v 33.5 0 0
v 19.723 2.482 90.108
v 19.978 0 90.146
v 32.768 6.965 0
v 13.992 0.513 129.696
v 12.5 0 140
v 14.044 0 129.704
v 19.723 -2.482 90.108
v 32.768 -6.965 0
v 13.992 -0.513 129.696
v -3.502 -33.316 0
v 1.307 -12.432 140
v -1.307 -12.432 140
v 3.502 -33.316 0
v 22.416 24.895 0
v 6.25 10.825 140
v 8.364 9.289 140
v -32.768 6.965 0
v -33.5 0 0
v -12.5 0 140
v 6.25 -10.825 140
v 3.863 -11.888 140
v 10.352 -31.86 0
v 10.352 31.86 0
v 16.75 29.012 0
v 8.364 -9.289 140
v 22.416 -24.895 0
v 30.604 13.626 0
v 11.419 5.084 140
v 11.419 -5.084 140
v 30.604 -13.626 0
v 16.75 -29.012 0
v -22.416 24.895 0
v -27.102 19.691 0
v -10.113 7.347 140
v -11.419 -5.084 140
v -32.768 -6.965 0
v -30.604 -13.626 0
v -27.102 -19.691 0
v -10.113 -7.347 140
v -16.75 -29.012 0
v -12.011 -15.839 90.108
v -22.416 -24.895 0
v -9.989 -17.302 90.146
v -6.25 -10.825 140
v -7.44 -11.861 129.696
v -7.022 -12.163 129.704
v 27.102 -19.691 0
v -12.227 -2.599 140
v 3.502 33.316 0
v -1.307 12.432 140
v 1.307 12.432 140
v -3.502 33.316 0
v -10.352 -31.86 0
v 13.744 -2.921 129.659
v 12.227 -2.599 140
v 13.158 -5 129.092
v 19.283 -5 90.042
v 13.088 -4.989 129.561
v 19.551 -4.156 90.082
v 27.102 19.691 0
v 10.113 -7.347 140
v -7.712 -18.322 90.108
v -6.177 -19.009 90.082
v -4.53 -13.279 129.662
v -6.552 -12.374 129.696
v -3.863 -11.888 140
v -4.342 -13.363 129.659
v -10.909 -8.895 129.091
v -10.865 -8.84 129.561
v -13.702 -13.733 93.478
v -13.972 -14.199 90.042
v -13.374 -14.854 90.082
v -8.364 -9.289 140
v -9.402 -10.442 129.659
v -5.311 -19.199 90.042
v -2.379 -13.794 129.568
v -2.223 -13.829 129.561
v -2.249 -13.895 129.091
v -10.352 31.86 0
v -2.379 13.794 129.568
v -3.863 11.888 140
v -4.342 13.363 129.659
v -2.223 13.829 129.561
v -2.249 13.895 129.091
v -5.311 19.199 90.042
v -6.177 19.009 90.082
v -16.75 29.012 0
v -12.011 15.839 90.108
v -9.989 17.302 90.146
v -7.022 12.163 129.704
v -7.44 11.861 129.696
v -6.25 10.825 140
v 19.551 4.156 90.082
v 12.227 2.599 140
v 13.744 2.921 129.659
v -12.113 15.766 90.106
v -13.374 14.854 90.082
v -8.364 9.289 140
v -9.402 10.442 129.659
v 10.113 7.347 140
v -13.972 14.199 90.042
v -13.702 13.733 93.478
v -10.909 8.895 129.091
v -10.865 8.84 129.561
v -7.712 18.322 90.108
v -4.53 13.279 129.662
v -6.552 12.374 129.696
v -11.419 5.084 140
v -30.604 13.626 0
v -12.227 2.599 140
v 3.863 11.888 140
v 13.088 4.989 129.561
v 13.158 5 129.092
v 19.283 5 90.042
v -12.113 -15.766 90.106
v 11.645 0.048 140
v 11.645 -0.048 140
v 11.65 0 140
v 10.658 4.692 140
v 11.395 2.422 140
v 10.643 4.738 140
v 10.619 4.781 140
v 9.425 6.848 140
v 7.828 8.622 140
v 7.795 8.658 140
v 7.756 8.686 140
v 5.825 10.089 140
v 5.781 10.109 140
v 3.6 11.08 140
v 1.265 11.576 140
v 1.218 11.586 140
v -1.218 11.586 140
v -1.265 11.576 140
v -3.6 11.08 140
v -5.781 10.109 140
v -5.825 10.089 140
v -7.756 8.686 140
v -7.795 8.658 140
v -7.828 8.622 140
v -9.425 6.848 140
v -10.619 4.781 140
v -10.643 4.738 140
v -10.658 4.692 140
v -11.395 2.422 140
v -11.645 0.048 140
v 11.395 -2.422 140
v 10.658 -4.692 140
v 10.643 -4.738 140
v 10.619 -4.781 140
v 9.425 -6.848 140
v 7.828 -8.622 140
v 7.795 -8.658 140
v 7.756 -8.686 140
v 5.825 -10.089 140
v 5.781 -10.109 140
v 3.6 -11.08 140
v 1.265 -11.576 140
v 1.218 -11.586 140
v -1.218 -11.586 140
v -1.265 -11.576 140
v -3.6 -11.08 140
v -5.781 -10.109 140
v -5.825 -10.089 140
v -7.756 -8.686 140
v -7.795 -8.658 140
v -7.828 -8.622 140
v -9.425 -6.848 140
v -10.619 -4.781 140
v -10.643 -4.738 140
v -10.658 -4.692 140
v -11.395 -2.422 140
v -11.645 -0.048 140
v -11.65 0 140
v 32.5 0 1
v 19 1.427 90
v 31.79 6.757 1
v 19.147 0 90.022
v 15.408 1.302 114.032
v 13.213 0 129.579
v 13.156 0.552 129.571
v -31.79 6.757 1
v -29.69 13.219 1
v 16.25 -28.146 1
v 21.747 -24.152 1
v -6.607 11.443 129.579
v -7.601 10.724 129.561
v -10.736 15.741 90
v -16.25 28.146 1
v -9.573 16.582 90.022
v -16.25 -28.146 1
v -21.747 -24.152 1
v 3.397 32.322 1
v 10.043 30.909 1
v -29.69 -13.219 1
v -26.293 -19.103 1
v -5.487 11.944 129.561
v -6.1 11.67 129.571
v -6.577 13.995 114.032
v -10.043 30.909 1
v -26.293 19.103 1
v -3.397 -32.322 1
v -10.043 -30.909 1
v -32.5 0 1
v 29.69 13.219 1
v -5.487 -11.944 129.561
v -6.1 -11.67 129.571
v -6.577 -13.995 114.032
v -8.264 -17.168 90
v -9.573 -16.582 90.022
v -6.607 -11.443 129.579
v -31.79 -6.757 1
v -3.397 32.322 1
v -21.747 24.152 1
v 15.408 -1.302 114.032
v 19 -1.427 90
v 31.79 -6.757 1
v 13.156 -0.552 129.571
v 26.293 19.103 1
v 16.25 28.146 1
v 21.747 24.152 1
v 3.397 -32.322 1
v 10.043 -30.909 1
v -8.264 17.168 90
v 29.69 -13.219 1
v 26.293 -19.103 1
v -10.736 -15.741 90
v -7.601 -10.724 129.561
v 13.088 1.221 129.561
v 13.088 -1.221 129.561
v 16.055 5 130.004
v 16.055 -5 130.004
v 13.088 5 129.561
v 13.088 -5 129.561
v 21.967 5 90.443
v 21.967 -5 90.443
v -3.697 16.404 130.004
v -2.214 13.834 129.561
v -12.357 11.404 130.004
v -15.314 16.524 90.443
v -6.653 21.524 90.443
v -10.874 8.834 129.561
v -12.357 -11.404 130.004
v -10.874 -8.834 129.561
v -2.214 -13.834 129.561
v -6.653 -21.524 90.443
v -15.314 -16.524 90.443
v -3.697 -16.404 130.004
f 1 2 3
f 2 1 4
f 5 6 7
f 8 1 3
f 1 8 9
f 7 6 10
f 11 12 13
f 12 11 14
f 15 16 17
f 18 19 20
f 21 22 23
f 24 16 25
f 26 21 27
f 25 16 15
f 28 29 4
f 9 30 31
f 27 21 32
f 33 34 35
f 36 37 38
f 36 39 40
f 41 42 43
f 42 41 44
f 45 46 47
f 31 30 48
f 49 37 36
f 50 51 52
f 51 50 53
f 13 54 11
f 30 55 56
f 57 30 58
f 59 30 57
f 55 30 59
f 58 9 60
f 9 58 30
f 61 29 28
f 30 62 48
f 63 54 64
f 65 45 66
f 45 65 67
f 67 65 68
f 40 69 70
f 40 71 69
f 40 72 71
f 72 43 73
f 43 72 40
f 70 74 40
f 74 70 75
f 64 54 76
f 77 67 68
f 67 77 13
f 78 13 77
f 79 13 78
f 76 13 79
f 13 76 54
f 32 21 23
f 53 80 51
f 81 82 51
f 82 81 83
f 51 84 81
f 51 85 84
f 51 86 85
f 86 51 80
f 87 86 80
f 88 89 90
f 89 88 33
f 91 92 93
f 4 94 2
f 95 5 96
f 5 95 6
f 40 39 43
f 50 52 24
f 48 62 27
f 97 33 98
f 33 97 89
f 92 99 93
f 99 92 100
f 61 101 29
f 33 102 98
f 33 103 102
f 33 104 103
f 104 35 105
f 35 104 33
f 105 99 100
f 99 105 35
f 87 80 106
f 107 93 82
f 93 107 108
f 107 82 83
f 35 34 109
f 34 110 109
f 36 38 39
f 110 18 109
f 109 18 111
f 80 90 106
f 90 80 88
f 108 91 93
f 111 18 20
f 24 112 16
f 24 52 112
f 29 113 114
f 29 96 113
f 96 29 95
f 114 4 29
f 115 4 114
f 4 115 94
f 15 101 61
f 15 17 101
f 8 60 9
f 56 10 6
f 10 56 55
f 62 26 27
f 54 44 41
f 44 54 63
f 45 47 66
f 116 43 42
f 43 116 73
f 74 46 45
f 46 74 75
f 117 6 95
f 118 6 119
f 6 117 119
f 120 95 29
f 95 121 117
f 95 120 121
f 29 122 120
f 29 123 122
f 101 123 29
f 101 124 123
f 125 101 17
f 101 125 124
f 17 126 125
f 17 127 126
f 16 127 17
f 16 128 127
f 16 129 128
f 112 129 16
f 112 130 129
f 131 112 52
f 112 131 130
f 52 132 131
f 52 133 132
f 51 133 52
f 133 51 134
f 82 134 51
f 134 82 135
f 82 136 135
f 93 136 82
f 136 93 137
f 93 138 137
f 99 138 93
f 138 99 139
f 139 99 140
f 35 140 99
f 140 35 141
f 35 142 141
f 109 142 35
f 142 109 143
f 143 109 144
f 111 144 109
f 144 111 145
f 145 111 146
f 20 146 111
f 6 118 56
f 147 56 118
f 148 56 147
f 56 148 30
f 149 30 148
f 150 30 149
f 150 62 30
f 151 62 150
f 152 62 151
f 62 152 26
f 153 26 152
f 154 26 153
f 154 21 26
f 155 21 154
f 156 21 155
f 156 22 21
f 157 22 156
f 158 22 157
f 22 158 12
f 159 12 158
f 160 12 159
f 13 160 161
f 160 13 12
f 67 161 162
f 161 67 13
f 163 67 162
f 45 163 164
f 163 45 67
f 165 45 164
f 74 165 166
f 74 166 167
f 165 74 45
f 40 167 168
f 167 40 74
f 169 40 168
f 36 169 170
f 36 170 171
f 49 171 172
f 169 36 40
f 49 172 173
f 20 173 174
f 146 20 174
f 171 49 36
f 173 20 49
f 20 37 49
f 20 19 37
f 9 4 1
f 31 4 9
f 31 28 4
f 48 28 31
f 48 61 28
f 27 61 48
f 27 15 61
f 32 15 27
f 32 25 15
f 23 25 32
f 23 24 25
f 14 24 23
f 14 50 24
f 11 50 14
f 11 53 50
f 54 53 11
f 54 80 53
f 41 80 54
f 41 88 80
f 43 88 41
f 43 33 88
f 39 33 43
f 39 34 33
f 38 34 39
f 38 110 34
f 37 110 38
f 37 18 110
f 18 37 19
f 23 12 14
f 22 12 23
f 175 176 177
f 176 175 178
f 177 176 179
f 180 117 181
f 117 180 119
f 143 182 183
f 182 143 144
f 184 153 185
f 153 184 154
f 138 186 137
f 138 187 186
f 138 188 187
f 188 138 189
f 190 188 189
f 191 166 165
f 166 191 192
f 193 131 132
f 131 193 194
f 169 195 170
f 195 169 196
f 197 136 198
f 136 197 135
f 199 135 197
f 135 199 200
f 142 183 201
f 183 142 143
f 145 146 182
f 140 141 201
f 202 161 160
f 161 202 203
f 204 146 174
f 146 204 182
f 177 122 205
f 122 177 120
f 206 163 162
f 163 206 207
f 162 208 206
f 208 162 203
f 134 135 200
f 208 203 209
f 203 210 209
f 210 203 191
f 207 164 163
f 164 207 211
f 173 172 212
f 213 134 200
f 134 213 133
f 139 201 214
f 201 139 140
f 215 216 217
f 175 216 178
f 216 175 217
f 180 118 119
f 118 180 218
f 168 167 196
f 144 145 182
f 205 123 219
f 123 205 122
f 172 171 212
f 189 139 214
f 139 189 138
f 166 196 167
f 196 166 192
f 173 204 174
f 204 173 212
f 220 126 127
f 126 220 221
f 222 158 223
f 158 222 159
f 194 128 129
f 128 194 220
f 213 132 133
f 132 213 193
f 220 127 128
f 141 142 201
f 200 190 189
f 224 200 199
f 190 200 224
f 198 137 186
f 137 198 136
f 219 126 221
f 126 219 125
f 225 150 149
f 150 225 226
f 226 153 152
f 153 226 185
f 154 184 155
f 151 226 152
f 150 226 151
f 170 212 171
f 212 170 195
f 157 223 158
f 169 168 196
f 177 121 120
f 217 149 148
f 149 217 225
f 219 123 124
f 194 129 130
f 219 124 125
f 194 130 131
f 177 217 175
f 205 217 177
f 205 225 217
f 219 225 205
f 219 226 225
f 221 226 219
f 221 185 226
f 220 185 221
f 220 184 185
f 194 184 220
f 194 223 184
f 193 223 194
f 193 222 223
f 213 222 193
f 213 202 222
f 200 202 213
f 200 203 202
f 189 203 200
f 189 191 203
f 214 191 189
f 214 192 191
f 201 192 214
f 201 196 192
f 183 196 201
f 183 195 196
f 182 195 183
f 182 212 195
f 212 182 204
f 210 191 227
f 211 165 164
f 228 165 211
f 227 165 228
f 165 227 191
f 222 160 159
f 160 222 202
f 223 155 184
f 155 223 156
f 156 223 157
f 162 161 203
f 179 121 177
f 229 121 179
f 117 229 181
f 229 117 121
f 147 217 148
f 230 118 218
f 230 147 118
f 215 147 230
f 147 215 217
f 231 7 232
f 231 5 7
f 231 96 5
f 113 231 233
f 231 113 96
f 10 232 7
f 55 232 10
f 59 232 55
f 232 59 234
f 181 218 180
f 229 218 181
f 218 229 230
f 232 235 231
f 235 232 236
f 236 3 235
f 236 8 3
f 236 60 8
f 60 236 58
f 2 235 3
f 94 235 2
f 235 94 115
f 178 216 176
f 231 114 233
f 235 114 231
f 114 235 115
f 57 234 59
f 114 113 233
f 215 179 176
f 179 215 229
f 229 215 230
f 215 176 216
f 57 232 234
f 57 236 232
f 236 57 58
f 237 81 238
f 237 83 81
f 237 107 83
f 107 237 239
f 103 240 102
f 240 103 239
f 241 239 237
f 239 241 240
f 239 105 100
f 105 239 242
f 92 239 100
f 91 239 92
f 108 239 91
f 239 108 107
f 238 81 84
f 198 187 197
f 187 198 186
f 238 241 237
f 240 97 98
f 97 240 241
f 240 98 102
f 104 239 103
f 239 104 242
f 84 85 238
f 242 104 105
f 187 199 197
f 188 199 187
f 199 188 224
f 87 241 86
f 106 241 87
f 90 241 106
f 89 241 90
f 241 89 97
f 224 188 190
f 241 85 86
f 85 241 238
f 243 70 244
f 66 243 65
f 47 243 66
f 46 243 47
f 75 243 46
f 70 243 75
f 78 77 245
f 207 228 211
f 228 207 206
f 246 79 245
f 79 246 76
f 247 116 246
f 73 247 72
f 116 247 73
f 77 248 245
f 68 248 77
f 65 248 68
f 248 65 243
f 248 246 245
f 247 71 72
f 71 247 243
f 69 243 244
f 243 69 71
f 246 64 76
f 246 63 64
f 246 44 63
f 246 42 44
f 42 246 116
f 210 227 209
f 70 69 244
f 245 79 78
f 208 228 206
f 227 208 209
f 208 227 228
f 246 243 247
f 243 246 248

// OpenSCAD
// Trumpet Mute
// (c) Wouter Robers

Length=140;
WallThickness=1;

difference(){
cylinder(r1=(25+Length*0.3)/2,r2=25/2,h=Length);
translate([0,0,WallThickness]) cylinder(r1=(25+Length*0.3)/2-WallThickness,r2=25/2-WallThickness,h=Length);
}

for (i=[0:120:359]){
rotate([0,0,i]) translate([19,-5,Length-50]) rotate([0,-8.5,0]) cube([3,10,40]);
}
